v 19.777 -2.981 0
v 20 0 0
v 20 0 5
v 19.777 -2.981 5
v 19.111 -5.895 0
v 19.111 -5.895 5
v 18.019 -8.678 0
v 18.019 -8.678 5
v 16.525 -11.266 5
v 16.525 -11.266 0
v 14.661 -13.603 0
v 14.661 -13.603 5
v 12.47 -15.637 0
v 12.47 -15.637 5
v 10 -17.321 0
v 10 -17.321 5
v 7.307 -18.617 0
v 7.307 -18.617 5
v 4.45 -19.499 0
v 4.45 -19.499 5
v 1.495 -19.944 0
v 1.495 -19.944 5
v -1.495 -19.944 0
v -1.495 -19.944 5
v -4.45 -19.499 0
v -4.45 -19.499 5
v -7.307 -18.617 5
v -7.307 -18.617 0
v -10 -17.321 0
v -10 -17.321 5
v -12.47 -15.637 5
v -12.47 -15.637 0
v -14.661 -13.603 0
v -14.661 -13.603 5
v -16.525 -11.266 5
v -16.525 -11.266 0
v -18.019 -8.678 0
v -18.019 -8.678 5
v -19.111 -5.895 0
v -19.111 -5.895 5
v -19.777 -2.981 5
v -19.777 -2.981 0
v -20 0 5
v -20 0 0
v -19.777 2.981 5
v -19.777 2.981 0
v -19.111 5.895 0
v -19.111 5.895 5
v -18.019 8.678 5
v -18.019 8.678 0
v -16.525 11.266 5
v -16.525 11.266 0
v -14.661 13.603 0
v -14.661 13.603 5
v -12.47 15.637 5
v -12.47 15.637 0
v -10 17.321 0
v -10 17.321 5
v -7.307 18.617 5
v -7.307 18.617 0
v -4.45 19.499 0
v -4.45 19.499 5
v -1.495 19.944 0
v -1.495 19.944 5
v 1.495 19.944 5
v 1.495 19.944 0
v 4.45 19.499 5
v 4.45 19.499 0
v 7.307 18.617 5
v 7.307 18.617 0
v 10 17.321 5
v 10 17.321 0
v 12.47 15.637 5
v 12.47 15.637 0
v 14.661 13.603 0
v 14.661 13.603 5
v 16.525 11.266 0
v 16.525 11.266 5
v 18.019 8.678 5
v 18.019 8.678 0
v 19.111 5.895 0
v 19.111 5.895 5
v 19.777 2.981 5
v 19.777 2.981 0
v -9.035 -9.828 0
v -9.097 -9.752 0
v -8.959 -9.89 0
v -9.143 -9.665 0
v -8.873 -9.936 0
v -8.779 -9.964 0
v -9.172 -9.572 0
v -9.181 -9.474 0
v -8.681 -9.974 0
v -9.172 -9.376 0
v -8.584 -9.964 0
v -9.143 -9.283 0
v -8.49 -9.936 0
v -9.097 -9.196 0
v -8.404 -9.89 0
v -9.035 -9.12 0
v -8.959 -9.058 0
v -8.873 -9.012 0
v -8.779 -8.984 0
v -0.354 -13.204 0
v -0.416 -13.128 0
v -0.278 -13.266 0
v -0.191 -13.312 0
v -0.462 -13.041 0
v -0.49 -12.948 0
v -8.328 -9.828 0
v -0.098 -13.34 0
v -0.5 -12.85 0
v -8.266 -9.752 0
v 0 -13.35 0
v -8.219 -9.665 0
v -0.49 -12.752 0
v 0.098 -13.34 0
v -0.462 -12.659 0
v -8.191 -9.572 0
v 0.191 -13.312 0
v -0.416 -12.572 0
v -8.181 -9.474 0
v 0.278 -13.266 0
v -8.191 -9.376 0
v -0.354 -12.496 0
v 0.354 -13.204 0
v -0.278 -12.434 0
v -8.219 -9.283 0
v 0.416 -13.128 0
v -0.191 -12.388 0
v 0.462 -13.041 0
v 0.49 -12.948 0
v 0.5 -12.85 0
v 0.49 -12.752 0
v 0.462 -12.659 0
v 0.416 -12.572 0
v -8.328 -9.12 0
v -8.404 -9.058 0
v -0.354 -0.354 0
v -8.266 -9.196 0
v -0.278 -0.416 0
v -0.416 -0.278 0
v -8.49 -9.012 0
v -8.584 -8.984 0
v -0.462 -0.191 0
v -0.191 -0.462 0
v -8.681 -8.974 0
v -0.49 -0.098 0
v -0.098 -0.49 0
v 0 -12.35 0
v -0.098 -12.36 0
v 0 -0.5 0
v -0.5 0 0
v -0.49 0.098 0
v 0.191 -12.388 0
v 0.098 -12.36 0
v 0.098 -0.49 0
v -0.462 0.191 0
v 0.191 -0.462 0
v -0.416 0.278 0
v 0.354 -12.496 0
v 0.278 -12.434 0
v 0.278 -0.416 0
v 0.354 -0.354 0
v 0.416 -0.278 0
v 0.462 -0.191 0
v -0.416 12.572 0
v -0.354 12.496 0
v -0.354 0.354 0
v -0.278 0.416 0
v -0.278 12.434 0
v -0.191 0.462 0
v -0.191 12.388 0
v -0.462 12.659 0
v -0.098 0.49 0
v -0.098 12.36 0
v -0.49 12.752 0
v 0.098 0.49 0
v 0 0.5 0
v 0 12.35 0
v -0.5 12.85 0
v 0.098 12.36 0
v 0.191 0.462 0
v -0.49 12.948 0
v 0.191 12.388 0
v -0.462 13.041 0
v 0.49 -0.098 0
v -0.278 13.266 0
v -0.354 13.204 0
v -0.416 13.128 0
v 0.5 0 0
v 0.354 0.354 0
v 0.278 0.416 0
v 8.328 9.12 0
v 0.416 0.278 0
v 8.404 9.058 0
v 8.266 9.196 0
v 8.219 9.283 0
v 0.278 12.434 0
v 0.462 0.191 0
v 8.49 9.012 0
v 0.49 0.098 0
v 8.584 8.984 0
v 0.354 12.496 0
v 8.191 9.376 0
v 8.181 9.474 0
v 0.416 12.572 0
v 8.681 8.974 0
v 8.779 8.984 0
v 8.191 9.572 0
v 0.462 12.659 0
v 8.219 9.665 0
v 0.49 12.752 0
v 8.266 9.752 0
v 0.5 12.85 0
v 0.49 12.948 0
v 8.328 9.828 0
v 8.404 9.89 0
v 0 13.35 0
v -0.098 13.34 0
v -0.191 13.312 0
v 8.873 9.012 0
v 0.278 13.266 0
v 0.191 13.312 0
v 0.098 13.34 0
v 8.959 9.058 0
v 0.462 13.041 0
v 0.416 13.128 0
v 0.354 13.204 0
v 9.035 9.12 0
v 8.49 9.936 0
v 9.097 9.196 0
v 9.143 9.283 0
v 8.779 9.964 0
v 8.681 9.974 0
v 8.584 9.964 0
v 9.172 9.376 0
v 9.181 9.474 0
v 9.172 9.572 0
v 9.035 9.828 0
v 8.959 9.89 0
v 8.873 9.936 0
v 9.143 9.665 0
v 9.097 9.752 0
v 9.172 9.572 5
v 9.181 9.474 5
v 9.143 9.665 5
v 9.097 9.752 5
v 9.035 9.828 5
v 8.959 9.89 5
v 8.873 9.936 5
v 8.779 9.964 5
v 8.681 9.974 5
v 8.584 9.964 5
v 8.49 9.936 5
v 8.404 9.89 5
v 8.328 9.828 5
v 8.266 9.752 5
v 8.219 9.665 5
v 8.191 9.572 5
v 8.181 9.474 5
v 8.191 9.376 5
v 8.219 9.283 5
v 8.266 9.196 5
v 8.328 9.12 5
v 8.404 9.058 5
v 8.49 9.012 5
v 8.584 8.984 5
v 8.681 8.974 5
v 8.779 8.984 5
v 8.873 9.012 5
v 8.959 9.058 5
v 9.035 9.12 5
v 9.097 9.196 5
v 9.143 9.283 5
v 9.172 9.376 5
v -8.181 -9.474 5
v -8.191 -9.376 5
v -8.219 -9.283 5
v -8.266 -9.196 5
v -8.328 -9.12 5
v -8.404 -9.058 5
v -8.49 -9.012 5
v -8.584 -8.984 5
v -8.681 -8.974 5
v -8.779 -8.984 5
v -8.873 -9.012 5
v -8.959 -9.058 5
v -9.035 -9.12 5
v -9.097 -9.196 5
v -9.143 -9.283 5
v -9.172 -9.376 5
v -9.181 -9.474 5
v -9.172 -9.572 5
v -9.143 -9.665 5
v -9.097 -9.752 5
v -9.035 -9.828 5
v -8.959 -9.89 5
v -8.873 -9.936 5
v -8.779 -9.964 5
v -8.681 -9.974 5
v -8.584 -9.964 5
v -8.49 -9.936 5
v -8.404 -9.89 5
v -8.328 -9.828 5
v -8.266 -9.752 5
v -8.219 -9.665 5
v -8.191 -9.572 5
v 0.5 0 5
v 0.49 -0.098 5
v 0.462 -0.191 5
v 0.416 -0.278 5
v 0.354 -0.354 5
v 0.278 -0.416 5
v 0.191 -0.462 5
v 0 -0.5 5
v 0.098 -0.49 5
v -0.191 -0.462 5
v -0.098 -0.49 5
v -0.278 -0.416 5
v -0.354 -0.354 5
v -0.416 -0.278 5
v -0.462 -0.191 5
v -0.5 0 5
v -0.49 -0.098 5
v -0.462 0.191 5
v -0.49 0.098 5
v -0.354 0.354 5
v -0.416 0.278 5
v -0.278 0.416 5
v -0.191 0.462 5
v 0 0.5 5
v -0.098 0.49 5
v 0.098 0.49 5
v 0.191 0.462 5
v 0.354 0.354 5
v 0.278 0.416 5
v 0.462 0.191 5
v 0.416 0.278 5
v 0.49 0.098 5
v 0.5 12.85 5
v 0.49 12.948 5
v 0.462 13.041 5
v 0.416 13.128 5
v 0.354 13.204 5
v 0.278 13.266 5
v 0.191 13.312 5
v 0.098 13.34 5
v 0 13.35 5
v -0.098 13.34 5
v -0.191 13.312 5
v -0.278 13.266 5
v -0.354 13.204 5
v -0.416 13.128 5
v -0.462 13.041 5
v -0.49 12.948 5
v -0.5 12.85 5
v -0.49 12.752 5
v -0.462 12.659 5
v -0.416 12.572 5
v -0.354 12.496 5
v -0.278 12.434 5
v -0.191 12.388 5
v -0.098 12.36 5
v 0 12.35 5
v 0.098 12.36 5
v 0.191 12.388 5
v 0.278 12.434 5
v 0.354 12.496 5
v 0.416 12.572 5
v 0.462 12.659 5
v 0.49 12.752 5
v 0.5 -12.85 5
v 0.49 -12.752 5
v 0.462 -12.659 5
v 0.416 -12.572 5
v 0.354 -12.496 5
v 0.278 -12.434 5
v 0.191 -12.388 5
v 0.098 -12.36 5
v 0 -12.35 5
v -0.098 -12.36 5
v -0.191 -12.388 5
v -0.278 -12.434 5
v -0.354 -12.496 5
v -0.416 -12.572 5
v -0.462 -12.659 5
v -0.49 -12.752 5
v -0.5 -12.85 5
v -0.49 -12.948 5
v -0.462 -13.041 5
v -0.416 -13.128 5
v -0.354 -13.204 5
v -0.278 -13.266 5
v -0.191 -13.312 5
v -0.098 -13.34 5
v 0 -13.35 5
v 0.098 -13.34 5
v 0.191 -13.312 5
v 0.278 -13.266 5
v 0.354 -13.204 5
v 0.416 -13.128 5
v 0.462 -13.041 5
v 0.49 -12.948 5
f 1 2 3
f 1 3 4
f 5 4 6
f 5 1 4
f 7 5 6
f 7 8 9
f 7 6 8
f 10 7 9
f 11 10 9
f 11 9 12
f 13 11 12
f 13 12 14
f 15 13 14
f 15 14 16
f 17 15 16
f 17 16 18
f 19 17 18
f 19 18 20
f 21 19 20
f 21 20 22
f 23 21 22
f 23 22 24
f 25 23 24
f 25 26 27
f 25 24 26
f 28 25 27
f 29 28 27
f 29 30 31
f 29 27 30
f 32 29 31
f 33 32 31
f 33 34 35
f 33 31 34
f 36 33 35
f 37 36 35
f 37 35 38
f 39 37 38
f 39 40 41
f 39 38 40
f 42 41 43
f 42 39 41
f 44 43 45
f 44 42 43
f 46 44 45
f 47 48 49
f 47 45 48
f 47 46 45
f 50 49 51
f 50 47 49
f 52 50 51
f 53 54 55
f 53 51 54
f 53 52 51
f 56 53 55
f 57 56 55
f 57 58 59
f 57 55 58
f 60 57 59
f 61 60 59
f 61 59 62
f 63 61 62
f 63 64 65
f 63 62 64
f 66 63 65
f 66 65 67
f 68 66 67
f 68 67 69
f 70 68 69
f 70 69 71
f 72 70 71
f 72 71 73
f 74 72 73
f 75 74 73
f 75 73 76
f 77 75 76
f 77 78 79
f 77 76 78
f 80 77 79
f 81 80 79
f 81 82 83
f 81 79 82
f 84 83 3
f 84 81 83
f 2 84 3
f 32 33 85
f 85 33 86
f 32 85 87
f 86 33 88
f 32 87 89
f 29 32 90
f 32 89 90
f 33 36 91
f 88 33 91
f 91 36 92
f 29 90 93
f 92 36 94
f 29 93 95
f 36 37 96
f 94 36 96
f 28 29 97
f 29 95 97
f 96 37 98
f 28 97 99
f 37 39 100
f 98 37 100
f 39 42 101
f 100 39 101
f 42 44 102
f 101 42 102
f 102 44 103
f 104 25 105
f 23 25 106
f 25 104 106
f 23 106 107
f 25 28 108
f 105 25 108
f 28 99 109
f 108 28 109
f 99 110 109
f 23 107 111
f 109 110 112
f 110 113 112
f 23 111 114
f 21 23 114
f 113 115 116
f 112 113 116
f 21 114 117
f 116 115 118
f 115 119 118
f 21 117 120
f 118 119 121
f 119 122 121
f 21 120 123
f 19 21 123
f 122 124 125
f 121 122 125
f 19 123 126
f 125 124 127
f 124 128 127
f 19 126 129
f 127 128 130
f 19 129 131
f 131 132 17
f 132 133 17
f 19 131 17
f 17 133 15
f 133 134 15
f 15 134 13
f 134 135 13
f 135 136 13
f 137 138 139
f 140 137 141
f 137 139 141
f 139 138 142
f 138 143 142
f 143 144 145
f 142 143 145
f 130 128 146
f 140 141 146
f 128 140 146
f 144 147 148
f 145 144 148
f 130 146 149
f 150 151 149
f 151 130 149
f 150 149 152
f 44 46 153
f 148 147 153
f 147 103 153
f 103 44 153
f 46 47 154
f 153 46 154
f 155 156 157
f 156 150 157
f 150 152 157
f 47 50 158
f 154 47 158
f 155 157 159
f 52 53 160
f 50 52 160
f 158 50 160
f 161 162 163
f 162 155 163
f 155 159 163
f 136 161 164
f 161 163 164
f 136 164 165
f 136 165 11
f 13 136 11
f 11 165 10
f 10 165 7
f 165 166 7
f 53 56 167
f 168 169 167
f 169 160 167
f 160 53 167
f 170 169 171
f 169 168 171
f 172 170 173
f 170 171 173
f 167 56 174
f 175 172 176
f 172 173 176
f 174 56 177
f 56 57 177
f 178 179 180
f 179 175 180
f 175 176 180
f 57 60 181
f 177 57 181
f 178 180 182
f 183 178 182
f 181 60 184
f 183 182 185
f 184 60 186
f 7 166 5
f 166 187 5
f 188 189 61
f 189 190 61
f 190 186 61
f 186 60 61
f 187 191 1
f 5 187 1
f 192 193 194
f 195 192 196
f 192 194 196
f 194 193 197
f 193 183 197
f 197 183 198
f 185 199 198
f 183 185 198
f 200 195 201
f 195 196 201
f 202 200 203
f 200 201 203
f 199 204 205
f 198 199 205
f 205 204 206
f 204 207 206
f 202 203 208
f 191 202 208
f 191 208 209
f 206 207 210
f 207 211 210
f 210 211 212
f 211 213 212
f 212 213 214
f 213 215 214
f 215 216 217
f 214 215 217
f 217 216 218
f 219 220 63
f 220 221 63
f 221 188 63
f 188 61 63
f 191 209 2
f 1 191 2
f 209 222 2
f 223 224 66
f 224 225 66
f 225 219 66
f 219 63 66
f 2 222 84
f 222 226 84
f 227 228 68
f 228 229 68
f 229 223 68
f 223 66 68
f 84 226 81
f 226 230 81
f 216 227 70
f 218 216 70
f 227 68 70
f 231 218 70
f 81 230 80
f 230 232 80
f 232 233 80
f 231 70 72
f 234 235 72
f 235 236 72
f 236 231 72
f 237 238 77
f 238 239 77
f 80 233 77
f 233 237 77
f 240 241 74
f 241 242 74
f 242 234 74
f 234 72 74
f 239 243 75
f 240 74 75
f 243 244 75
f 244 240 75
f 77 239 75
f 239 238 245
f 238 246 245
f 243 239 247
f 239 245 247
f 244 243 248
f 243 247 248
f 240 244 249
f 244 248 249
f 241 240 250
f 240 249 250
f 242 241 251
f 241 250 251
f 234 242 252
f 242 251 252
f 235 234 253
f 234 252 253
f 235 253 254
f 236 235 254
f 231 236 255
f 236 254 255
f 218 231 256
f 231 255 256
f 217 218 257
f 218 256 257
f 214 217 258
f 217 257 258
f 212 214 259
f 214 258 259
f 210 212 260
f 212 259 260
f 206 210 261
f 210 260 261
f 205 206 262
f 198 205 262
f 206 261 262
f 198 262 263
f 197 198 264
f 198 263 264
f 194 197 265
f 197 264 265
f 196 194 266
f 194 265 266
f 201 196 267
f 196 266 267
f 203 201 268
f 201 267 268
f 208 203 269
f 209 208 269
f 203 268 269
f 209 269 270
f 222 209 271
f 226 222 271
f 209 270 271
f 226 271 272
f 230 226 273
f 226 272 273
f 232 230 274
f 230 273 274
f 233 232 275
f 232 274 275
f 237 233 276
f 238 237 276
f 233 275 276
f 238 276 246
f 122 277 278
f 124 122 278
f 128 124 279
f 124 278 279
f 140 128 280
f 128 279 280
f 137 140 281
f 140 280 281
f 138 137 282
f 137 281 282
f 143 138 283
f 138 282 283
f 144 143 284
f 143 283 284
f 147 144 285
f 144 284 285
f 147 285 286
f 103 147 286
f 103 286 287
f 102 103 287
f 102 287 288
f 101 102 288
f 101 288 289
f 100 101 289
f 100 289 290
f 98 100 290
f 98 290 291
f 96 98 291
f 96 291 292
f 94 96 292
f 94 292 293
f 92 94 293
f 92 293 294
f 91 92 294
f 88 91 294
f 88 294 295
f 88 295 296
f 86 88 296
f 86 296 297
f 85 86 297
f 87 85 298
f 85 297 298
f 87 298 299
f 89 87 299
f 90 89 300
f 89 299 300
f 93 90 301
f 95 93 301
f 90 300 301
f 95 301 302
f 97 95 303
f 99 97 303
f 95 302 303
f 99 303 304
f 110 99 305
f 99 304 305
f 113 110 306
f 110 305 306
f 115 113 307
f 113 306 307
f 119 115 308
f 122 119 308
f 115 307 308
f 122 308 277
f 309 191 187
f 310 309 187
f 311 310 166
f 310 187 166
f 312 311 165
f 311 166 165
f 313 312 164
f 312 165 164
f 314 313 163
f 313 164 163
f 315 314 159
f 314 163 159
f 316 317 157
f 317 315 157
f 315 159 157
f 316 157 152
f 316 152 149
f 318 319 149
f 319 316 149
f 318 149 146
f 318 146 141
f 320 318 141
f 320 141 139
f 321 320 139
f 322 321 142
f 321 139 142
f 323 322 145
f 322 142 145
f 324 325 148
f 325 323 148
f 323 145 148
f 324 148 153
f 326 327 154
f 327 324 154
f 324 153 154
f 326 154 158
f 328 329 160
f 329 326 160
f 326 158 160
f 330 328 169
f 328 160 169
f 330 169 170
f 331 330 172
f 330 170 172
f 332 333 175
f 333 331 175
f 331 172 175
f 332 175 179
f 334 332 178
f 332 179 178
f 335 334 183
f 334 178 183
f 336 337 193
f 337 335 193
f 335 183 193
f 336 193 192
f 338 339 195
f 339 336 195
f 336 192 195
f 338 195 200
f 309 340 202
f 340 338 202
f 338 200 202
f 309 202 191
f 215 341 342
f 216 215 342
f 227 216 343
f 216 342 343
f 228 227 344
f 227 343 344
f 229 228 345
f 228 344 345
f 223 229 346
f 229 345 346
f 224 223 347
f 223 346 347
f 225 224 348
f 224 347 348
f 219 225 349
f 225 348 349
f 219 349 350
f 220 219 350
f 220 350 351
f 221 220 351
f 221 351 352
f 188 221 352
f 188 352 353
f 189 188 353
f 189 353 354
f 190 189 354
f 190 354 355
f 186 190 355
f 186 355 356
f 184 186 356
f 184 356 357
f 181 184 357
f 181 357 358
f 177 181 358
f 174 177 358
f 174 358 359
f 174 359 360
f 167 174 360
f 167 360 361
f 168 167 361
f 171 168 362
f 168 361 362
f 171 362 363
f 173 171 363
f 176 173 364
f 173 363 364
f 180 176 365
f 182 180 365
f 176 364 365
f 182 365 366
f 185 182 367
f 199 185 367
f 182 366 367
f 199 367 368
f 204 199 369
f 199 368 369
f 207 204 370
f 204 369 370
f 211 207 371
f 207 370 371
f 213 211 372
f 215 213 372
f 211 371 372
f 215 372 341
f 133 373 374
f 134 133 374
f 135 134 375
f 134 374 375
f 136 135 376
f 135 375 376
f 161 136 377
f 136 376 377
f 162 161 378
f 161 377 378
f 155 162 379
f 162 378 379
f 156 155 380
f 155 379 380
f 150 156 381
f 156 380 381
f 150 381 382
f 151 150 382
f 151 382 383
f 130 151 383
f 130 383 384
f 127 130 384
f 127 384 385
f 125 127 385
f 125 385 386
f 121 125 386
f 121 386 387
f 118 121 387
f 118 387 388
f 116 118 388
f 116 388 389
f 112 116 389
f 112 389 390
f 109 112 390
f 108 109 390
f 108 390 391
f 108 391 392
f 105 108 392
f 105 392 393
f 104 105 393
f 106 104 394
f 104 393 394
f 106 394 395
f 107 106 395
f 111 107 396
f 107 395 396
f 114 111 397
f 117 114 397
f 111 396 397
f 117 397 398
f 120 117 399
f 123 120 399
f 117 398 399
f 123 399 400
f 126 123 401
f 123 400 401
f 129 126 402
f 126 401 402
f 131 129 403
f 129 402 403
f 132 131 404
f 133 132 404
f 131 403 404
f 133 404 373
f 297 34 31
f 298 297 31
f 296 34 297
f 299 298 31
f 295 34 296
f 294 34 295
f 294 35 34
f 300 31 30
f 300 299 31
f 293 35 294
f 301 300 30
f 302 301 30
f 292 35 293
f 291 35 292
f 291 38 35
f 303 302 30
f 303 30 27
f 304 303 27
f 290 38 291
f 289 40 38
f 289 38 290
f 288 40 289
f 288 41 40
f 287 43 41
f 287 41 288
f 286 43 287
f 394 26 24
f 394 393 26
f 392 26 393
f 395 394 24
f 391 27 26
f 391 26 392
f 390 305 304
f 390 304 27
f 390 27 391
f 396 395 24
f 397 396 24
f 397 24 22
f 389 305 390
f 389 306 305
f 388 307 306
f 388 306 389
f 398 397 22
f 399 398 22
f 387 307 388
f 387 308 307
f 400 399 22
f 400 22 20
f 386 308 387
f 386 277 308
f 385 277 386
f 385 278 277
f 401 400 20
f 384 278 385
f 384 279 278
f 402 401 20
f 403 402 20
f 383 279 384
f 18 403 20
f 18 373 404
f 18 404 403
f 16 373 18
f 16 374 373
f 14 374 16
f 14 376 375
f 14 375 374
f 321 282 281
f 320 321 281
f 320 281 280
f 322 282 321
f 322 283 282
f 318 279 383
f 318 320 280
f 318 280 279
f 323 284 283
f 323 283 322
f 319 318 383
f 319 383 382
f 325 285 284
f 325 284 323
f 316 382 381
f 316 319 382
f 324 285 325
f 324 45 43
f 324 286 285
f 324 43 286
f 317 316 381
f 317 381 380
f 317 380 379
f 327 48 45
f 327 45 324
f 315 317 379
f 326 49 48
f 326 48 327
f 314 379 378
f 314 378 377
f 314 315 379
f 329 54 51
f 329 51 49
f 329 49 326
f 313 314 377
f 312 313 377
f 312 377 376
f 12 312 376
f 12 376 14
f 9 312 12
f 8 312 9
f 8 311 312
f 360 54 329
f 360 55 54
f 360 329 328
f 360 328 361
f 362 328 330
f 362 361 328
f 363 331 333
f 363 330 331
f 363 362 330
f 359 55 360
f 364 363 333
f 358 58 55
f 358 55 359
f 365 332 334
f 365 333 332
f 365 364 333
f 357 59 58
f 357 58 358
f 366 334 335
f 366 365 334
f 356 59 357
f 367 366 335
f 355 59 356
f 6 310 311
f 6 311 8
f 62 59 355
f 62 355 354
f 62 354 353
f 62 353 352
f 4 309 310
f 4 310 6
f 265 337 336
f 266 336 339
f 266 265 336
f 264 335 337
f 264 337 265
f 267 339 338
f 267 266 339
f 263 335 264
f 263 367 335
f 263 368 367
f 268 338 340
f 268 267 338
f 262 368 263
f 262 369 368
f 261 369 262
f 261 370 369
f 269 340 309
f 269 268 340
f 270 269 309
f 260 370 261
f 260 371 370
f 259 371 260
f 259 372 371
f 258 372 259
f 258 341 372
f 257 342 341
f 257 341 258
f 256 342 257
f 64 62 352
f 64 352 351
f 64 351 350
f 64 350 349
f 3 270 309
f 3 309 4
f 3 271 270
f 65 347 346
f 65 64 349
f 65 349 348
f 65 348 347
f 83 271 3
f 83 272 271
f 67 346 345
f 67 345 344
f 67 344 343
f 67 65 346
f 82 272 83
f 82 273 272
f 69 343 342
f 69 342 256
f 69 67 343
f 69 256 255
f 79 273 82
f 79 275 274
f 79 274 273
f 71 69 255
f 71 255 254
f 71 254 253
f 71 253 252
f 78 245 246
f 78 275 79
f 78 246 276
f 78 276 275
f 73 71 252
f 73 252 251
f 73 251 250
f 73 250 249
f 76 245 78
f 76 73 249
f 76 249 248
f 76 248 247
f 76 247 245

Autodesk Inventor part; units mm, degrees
ref_plane "YZ Plane" through (0, 0, 0) normal (1, 0, 0) x (0, 1, 0)
ref_plane "XZ Plane" through (0, 0, 0) normal (0, 1, 0) x (-1, 0, 0)
ref_plane "XY Plane" through (0, 0, 0) normal (0, 0, 1) x (1, 0, 0)
sketch "Sketch1" plane through (0, 0, 0) normal (0, 0, 1) x (1, 0, 0)
  circle A0 centre (0, 0) radius 20
  circle A1 centre (0, 0) radius 0.5
  dimension "d0" = 40
  dimension "d1" = 1
extrude "Extrusion1" add sketch "Sketch1" along normal blind 5
sketch "Sketch2" plane through (0, 0, 5) normal (0, 0, 1) x (1, 0, 0)
  circle A0 centre (0, 0) radius 0.5 projected
  line L0 (0, 0) -> (0, 12.85)
  circle A1 centre (0, 12.85) radius 0.5
  line L1 (0, 0) -> (8.6813, 9.474)
  circle A2 centre (8.6813, 9.474) radius 0.5
  circle A3 centre (0, 0) radius 20 projected
  line L2 (0, 0) -> (-20, 0)
  line L3 (0, 0) -> (20, 0) construction
  line L4 (0, 0) -> (-8.6813, -9.474)
  line L5 (0, 0) -> (12.85, 0) construction
  circle A4 centre (-8.6813, -9.474) radius 0.5
  line L6 (0, 0) -> (0, -12.85)
  circle A5 centre (0, -12.85) radius 0.5
  dimension "d4" = 12.85
  dimension "d5" = 1
  dimension "d6" = 12.85
  dimension "d8" = 1
  dimension "d15" = 90
  dimension "d17" = 47.5
  dimension "d18" = 42.5
  dimension "d20" = 12.85
  dimension "d21" = 132.5
  dimension "d22" = 1
  dimension "d23" = 12.85
  dimension "d24" = 1
  dimension "d25" = 42.5
extrude "Extrusion2" cut sketch "Sketch2" against normal blind 5 contours A5 | A4 | A1 | A2
properties part number "dondurgec"
